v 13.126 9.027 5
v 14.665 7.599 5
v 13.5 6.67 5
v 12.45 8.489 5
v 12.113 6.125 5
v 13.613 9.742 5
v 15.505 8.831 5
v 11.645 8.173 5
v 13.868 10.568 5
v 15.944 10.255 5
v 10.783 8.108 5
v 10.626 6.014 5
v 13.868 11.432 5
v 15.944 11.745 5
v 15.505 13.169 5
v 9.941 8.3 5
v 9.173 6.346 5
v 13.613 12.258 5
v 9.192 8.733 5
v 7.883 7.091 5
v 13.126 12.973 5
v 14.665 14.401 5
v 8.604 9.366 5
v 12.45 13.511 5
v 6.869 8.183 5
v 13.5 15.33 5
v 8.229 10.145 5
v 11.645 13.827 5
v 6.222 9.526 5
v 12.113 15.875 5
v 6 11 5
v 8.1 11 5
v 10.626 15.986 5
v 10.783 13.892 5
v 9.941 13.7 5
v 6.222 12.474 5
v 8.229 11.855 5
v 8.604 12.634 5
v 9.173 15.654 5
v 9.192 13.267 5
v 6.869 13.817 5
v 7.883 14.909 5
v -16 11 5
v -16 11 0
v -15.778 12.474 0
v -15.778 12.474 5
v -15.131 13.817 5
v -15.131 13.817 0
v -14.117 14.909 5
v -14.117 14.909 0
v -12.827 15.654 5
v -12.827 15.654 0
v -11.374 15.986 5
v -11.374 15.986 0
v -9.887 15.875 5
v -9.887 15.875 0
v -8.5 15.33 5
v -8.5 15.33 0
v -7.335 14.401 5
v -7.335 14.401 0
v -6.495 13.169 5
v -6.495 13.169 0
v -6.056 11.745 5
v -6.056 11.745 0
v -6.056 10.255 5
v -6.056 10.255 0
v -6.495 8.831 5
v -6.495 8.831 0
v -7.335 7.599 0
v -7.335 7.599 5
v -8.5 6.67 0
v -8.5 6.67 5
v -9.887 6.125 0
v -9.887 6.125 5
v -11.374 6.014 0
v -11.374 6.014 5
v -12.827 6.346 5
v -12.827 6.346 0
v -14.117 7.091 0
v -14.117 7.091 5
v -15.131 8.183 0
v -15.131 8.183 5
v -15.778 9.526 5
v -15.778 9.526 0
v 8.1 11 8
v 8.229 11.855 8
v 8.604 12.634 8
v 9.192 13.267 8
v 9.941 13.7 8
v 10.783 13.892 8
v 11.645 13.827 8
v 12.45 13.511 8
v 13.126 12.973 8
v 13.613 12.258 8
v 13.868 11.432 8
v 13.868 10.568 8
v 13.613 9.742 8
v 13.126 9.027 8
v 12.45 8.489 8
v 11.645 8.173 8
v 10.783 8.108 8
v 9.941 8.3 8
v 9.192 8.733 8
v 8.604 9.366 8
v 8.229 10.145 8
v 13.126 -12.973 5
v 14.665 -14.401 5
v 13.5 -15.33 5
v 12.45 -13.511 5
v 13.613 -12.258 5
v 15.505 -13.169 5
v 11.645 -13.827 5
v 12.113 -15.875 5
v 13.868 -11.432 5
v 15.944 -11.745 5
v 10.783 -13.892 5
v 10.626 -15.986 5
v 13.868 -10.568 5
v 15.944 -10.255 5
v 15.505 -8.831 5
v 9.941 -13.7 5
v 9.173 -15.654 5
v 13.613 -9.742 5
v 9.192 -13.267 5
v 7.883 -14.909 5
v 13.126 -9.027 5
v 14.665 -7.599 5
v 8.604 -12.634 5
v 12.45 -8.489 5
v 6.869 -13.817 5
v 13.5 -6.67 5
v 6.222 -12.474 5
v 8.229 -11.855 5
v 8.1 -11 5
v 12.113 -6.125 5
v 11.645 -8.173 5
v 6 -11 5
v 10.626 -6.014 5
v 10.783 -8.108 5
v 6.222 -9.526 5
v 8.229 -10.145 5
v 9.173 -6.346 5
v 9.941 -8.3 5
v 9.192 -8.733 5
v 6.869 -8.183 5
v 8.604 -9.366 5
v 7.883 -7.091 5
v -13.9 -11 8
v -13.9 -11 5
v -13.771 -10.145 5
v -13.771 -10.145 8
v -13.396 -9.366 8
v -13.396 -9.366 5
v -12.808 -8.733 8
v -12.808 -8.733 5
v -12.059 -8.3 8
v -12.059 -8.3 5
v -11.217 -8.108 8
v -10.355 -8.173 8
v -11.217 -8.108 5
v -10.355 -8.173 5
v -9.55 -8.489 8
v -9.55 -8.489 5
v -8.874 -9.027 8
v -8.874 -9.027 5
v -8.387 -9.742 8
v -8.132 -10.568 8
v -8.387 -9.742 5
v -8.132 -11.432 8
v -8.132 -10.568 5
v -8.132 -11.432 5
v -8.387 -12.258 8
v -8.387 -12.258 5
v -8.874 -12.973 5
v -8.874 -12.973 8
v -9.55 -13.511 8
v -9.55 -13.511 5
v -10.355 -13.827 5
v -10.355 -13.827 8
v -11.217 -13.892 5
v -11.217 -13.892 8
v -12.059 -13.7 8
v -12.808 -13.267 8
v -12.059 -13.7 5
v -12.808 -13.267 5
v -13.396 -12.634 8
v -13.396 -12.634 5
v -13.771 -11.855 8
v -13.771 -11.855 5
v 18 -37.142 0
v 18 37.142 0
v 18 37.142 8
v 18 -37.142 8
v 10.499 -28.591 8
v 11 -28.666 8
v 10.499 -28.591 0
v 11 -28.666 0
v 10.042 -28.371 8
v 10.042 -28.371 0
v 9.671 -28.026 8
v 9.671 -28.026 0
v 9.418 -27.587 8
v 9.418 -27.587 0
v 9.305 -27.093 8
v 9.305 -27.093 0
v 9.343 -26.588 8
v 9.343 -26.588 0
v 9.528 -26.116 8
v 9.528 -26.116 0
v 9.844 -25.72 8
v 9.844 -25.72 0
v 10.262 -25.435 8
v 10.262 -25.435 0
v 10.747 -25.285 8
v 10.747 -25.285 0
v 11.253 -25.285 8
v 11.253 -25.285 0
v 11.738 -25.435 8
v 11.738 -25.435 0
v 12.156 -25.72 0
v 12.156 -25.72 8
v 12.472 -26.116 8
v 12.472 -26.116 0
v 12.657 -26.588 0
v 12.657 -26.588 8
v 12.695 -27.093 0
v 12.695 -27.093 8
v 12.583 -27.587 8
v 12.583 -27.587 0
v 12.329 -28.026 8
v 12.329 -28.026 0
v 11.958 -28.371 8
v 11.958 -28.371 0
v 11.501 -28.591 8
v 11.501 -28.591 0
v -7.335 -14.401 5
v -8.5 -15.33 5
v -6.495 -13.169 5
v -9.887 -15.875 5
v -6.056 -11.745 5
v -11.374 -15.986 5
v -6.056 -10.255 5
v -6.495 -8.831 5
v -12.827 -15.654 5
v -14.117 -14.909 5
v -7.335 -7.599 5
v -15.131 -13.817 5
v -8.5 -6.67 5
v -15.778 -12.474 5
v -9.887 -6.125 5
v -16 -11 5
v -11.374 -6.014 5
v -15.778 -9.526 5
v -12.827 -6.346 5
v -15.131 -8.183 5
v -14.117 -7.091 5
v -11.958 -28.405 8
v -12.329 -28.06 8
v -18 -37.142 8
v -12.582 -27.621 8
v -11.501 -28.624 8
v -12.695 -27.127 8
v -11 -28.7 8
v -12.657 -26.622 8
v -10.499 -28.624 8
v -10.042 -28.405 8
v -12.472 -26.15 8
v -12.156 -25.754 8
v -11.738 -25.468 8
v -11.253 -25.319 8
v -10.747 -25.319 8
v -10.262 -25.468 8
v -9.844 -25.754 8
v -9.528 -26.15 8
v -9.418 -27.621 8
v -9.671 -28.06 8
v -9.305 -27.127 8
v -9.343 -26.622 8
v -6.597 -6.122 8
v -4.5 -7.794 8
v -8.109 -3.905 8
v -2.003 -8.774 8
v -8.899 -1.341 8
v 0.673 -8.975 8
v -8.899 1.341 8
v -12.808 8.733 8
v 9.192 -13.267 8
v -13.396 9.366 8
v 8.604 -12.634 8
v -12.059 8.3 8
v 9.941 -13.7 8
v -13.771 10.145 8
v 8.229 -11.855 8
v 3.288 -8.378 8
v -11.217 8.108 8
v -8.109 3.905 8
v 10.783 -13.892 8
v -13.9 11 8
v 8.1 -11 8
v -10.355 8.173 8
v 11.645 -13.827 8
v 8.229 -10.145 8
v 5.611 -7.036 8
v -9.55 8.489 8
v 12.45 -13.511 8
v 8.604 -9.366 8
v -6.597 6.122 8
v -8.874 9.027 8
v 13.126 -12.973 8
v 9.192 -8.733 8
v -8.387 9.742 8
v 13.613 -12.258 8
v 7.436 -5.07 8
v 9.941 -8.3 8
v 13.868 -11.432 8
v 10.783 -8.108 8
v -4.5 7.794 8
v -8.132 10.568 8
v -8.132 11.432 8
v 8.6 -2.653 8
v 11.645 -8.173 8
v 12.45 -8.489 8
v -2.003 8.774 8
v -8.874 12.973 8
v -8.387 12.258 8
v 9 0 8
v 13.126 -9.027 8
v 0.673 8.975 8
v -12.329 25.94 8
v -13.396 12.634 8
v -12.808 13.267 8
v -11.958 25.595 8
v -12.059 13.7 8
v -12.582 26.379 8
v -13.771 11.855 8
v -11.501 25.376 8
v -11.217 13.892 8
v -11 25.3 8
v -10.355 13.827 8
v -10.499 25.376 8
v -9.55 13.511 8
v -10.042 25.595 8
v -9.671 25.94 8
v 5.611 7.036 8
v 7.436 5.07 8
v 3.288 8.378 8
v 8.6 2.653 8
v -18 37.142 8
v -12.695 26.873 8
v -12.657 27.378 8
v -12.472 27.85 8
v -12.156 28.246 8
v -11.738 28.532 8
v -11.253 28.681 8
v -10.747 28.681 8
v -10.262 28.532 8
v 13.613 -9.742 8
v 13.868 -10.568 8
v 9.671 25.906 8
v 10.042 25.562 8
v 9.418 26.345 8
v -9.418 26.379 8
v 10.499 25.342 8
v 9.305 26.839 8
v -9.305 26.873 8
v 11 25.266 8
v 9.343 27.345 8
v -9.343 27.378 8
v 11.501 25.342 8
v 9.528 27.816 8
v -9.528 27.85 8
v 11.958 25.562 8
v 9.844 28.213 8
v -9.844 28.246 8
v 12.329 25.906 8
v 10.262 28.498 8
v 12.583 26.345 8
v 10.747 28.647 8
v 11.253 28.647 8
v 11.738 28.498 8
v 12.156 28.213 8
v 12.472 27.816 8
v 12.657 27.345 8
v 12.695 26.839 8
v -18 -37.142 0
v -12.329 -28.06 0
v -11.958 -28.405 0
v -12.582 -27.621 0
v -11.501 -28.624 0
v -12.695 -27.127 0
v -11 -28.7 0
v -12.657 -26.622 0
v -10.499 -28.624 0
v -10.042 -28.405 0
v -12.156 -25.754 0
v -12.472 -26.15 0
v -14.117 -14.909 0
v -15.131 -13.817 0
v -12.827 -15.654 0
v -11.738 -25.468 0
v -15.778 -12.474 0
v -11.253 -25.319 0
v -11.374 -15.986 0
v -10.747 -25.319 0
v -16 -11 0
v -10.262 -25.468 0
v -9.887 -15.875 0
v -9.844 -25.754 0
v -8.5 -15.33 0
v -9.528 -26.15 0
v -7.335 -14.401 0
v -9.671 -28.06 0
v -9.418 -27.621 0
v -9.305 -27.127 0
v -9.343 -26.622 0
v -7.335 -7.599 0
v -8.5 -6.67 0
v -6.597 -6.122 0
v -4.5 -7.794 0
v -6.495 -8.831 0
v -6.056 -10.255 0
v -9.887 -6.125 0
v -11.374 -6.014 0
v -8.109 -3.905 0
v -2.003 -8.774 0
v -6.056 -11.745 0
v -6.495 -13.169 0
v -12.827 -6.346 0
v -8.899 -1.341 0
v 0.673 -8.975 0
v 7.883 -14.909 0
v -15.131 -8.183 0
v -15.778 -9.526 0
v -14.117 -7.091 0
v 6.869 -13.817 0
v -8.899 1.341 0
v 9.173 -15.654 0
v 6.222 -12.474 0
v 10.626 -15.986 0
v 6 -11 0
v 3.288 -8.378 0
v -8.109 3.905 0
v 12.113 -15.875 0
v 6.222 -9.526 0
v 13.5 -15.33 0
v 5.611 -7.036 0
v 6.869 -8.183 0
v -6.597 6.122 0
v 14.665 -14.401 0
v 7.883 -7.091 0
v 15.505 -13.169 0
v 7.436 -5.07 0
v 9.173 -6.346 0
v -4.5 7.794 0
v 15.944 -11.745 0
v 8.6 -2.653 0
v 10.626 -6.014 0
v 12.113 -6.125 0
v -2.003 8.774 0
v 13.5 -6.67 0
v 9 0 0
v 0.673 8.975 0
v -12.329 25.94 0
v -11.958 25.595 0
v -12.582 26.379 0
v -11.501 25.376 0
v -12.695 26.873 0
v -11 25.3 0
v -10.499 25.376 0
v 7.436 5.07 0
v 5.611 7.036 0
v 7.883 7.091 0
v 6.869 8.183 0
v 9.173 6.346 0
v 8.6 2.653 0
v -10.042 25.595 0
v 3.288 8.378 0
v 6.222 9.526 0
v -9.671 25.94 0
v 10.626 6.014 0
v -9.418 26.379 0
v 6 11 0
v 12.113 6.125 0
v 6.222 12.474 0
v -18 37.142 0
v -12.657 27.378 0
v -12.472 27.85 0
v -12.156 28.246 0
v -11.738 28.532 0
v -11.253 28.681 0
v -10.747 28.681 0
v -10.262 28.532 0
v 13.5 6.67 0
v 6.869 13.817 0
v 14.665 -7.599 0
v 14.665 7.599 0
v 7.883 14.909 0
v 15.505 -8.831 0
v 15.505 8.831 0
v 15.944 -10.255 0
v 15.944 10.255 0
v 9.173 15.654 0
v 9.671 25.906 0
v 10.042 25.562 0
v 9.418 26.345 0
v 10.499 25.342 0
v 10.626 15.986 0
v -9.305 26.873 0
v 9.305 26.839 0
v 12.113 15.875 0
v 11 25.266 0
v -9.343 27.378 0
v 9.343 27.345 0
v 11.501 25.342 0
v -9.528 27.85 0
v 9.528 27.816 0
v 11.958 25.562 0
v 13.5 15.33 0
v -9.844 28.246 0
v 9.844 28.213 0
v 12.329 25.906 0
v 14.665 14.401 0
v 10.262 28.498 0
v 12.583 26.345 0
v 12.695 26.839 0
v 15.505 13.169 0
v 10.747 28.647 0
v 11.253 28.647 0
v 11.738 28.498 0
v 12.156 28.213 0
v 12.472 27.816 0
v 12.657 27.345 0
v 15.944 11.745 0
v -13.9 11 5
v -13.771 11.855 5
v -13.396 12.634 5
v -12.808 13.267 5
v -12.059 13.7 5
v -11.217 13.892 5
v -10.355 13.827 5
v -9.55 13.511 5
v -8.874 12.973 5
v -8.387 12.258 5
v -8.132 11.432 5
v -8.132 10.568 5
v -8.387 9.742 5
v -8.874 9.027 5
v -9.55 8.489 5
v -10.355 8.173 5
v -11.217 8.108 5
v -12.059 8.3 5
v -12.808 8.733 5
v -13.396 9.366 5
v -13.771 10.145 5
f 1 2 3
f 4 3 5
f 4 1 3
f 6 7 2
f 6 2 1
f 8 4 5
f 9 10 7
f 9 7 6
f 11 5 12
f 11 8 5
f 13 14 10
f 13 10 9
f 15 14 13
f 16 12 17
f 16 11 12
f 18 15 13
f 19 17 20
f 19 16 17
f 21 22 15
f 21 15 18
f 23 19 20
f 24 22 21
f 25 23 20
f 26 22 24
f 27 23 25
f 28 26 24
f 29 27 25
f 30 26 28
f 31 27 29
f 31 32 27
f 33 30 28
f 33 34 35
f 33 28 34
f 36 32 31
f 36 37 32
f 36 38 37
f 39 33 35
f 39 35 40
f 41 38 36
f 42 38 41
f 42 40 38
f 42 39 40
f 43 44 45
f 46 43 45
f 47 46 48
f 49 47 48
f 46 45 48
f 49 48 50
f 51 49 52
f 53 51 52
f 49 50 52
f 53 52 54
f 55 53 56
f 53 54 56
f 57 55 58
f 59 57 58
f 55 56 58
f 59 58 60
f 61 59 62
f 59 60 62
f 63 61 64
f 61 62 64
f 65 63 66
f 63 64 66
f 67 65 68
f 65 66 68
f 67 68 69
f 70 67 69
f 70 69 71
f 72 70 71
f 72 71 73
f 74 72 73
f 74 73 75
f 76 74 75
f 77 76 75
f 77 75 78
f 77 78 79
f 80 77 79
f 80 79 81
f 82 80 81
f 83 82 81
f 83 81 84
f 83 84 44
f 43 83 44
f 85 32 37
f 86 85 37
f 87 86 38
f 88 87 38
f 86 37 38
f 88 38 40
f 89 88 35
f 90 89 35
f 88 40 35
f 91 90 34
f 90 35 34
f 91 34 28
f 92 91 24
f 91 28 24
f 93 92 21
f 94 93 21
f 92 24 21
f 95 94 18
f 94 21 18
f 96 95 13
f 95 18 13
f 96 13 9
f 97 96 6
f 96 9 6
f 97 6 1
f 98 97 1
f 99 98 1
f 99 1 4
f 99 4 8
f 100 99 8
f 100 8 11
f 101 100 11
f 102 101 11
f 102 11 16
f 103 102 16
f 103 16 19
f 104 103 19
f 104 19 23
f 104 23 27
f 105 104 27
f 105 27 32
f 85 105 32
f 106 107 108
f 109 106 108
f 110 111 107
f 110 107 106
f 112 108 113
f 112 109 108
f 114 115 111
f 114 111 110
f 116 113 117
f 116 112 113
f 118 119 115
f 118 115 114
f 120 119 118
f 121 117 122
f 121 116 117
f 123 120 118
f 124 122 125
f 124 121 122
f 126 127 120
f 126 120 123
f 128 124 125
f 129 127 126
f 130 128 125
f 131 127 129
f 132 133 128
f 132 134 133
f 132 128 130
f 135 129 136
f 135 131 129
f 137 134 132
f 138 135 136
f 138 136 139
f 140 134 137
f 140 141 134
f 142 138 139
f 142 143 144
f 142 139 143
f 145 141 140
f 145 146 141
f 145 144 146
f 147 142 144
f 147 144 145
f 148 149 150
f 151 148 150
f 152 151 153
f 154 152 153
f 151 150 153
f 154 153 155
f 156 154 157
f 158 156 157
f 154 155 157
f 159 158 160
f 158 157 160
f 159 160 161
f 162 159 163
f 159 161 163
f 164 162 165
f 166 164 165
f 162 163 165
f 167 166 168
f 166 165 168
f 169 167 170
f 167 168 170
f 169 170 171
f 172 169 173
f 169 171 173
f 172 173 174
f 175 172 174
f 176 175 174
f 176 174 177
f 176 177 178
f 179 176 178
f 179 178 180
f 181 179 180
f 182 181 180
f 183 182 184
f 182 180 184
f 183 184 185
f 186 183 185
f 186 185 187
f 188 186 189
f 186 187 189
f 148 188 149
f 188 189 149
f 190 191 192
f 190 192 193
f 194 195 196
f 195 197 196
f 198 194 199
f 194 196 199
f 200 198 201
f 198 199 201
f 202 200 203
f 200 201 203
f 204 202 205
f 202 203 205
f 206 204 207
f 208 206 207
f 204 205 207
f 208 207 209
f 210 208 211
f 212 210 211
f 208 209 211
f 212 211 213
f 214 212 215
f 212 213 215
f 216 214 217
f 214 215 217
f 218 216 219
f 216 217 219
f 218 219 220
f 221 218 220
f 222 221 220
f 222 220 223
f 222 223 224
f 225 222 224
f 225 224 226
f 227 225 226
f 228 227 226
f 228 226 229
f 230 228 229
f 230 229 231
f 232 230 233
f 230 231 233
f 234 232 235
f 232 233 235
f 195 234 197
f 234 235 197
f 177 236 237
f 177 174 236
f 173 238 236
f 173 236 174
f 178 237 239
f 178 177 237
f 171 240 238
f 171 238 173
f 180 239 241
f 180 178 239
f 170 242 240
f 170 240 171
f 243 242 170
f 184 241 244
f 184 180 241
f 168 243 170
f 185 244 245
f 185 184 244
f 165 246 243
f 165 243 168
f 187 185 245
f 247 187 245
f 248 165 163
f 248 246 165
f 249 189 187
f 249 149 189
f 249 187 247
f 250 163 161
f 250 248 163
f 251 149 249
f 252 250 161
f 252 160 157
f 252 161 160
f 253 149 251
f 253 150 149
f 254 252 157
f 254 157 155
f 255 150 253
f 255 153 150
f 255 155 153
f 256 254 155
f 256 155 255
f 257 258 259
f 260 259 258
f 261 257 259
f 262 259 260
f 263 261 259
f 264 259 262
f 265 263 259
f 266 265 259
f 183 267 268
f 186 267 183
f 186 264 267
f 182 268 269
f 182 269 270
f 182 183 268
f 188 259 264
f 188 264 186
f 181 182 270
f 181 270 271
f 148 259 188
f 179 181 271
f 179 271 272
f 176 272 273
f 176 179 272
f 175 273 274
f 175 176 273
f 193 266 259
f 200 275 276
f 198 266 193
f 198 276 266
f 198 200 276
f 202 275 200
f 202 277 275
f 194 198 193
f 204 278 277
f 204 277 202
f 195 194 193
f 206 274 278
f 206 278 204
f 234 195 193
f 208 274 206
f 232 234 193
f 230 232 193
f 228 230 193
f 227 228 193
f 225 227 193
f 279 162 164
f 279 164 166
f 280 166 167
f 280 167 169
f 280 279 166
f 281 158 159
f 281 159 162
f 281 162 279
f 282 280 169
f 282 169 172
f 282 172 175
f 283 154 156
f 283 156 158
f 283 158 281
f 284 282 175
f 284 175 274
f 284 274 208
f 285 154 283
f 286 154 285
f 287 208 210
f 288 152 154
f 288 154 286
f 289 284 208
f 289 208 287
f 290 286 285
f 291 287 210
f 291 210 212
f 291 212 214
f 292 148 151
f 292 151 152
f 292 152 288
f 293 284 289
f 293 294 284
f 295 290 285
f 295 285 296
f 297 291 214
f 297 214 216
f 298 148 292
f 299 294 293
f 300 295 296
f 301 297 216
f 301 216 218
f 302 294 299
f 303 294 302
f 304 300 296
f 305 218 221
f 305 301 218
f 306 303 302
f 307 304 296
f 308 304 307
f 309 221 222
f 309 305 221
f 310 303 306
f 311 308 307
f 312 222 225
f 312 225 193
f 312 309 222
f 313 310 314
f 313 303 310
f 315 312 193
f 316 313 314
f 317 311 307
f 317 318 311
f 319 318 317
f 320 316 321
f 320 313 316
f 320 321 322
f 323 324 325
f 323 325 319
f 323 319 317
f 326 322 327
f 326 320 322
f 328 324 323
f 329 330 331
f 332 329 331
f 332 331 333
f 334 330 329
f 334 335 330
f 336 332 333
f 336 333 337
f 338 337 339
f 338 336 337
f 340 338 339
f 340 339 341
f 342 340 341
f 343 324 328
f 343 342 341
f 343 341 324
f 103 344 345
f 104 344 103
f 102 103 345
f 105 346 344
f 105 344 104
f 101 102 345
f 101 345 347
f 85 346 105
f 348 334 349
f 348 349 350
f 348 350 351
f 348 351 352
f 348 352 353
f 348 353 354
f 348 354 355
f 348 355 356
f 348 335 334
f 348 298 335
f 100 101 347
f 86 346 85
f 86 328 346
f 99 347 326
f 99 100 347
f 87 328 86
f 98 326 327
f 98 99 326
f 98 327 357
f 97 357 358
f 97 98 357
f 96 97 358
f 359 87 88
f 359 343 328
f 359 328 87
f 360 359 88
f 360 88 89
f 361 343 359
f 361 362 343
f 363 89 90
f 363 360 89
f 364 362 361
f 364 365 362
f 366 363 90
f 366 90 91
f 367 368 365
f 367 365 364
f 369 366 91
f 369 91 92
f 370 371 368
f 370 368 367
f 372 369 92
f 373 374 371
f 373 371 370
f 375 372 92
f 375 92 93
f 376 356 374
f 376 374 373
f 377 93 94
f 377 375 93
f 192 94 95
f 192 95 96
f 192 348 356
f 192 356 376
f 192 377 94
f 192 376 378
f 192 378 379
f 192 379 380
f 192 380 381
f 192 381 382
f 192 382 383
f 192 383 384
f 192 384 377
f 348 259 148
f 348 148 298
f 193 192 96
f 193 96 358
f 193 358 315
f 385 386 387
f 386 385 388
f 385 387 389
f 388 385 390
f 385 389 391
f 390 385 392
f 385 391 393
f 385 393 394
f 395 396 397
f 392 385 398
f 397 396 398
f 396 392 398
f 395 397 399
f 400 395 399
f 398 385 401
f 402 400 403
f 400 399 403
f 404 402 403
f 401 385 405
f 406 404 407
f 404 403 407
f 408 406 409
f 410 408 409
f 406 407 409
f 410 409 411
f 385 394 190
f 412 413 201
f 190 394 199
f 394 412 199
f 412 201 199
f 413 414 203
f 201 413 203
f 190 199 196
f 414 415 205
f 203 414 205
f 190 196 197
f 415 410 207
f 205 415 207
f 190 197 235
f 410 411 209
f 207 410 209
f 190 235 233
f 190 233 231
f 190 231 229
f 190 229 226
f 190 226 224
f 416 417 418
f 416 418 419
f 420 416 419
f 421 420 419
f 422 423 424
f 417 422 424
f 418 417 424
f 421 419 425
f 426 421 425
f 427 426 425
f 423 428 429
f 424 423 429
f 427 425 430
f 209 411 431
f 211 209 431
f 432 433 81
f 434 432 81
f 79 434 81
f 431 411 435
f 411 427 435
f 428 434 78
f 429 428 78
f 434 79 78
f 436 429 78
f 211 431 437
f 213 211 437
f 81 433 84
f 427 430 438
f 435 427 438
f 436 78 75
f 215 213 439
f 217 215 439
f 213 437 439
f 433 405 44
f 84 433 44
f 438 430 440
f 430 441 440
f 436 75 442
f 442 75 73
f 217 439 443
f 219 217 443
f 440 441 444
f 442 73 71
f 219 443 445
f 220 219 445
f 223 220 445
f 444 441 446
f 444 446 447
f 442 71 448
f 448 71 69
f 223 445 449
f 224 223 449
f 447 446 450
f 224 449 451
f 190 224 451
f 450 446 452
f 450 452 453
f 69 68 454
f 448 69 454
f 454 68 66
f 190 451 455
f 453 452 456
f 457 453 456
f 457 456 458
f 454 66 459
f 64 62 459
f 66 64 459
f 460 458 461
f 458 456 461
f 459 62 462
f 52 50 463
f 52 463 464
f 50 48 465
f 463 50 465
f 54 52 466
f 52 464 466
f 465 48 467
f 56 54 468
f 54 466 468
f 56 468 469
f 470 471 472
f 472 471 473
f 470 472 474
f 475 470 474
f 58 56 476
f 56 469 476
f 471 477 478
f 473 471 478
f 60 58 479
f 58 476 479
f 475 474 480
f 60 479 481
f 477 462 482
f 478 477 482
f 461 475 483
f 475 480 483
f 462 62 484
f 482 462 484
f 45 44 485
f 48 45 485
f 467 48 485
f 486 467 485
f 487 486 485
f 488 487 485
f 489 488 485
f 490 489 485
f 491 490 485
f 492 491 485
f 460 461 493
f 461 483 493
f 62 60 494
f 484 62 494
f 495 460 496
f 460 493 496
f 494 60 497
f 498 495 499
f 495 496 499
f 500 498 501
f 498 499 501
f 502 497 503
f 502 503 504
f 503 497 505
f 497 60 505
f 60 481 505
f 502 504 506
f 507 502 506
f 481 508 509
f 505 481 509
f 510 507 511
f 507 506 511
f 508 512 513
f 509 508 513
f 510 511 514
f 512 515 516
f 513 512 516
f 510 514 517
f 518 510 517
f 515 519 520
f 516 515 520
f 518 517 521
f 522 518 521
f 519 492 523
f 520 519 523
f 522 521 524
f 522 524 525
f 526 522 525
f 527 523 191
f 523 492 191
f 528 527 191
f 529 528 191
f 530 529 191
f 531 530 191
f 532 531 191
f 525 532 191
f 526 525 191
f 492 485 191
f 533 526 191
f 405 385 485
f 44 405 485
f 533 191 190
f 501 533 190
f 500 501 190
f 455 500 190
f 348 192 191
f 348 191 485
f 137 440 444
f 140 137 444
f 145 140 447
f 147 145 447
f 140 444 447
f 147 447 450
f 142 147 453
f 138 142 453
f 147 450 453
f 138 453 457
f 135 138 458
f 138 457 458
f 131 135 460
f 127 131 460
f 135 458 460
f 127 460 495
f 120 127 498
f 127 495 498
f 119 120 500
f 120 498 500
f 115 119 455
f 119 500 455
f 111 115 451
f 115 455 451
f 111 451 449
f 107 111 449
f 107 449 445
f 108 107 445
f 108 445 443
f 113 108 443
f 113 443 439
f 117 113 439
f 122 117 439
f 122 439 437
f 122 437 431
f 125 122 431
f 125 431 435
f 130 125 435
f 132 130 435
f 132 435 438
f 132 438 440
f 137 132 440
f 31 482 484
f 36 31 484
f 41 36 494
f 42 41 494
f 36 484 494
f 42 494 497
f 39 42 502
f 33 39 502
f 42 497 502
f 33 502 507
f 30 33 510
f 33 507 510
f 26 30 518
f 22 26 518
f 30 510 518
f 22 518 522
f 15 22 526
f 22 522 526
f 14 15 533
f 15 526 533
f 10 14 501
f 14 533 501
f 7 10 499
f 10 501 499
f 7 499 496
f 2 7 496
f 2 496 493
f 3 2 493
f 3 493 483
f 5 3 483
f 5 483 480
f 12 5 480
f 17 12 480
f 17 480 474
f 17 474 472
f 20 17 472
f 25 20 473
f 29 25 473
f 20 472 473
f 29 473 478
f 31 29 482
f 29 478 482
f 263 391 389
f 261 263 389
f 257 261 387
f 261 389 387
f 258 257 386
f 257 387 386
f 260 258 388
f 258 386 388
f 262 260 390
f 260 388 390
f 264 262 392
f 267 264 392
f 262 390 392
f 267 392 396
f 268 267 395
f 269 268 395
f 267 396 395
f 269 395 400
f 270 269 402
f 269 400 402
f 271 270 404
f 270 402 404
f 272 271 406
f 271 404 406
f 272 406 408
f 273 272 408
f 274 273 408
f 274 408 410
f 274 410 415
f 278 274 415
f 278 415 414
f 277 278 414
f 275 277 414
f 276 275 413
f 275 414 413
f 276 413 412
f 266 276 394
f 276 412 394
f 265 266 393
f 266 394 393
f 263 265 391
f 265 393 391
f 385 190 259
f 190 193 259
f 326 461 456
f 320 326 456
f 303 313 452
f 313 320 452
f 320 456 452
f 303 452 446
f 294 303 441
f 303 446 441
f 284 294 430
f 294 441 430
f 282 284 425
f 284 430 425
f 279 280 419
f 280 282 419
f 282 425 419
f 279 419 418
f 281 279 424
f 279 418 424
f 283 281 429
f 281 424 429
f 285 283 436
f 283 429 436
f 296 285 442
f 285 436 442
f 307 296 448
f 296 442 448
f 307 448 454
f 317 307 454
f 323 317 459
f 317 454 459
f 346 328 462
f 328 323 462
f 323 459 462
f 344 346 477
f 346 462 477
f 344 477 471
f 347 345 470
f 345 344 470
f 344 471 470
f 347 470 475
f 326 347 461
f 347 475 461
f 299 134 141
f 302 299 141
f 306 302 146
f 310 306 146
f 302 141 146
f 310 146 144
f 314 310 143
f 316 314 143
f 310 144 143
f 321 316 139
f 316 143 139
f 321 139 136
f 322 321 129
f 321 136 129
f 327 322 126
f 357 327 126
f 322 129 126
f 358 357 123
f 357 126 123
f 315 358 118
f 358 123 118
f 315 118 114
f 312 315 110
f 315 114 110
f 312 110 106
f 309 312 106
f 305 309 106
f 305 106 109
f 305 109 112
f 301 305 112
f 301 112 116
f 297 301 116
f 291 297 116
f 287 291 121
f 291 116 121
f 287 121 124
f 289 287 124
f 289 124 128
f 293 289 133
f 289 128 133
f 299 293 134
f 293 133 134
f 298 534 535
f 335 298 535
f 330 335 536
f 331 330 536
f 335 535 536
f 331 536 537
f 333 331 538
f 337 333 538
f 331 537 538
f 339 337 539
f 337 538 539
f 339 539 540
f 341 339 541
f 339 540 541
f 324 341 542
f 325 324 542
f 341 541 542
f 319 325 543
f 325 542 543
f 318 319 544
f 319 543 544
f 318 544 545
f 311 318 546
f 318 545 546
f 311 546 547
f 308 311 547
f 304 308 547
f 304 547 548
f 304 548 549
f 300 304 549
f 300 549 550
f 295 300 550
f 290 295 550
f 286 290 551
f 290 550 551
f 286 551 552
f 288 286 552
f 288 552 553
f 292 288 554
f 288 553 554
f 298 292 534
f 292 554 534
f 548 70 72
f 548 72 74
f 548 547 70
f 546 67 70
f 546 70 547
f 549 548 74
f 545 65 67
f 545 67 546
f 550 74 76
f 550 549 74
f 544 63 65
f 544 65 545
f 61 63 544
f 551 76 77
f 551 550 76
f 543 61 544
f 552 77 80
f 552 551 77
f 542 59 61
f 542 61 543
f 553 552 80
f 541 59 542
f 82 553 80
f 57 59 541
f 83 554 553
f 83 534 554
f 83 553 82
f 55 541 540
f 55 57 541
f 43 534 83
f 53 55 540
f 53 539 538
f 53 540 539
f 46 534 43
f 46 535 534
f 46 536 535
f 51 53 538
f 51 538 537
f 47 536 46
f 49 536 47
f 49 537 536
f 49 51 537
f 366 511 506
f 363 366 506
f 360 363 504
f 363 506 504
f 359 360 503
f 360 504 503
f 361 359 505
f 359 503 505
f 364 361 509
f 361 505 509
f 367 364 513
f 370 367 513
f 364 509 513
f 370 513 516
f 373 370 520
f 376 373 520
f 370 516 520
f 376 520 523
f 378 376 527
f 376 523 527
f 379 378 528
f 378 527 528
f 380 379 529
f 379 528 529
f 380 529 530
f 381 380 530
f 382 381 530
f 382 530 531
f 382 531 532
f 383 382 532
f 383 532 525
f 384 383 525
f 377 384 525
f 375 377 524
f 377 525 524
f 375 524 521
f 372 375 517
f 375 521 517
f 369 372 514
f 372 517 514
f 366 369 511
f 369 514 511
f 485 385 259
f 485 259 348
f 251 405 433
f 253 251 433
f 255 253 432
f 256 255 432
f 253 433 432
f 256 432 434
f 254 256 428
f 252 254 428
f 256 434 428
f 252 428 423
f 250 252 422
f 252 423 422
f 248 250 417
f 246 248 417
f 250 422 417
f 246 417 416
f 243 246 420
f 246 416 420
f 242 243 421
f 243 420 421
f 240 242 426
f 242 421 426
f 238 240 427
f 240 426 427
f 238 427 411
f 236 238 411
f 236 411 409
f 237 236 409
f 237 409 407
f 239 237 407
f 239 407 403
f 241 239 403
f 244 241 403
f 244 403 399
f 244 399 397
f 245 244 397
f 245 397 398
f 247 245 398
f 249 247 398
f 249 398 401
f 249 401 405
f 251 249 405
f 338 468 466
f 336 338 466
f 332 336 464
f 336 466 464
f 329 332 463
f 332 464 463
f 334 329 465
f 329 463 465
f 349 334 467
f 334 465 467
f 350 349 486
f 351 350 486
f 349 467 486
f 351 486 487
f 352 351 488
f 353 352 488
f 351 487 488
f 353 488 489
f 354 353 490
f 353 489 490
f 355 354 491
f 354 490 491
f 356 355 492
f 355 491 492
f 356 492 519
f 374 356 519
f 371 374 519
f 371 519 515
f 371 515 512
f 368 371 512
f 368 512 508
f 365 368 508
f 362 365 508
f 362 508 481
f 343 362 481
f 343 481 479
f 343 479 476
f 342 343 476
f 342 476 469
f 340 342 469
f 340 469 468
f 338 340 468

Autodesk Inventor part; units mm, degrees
ref_plane "YZ Plane" through (0, 0, 0) normal (1, 0, 0) x (0, 1, 0)
ref_plane "XZ Plane" through (0, 0, 0) normal (0, 1, 0) x (-1, 0, 0)
ref_plane "XY Plane" through (0, 0, 0) normal (0, 0, 1) x (1, 0, 0)
sketch "Sketch1" plane through (0, 0, 0) normal (0, 0, 1) x (1, 0, 0)
  line L0 (0, -50) -> (-18, -50)
  line L1 (-18, -50) -> (-18, 50)
  line L2 (-18, 50) -> (18, 50)
  line L3 (18, 50) -> (18, -50)
  line L4 (18, -50) -> (0, -50)
  circle A0 centre (0, 0) radius 9
extrude "Extrusion2" add sketch "Sketch1" along normal blind 8
sketch "Sketch3" plane through (0, 0, 8) normal (0, 0, 1) x (1, 0, 0)
  line L0 (-18, 0) -> (18, 0) construction
  line L1 (18, 50) -> (18, -50) construction
  line L2 (-18, 50) -> (-18, -50) construction
  line L3 (-18, -50) -> (18, -50) projected
  line L4 (-18, -50) -> (18, -50)
  line L5 (18, -50) -> (18, -38)
  line L6 (18, -38) -> (-18, -38)
  line L7 (-18, -38) -> (-18, -50)
  line L8 (18, 50) -> (-18, 50) projected
  line L9 (-18, 50) -> (18, 50)
  line L10 (18, 50) -> (18, 38)
  line L11 (18, 38) -> (-18, 38)
  line L12 (-18, 38) -> (-18, 50)
  point P0 (0, 0)
  point P1 (-11, -27)
  point P2 (11.0001, -26.9664)
  point P3 (-11, 27)
  point P4 (11.0001, 26.9664)
  dimension "d57" = 36
  dimension "d58" = 12
  dimension "d59" = 36
  dimension "d60" = 12
hole "Hole1" at (-11, -27, 8) at (11.0001, -26.9664, 8) at (-11, 27, 8) at (11.0001, 26.9664, 8) direction (0, 0, -1) diameter 3.4 end through all clearance for "Countersunk Flat Head Screw ISO 2009/7046" size "M3" standard "ISO"
sketch "Sketch6" plane through (0, 0, 0) normal (0, 0, -1) x (-1, 0, 0)
  circle A0 centre (-11, -11) radius 2.9
  circle A1 centre (11, -11) radius 2.9
  circle A2 centre (11, 11) radius 2.9
  circle A3 centre (-11, 11) radius 2.9
  point P0 (0, 0)
extrude "Extrusion5" cut sketch "Sketch6" against normal through all
sketch "Sketch7" plane through (0, 0, 0) normal (0, 0, -1) x (-1, 0, 0)
  circle A0 centre (-11, -11) radius 2.9 projected
  circle A1 centre (-11, -11) radius 5
  circle A2 centre (-11, 11) radius 2.9 projected
  circle A3 centre (-11, 11) radius 5
  circle A4 centre (11, 11) radius 2.9 projected
  circle A5 centre (11, 11) radius 5
  circle A6 centre (11, -11) radius 2.9 projected
  circle A7 centre (11, -11) radius 5
  point P0 (0, 0)
  dimension "d44" = 10
  dimension "d45" = 10
  dimension "d46" = 10
  dimension "d47" = 10
extrude "Extrusion6" cut sketch "Sketch7" against normal blind 5
sketch "Sketch8" plane through (0, 0, 8) normal (0, 0, 1) x (1, 0, 0)
  line L0 (-18, 50) -> (-18, -50) projected
  line L1 (18, -49.142) -> (18, -37.142)
  line L2 (18, -37.142) -> (-18, -37.142)
  line L3 (-18, -37.142) -> (-18, -49.142)
  line L4 (18, 49.142) -> (18, 37.142)
  line L5 (18, 37.142) -> (-18, 37.142)
  line L6 (-18, 37.142) -> (-18, 49.142)
  line L7 (-18, -50) -> (18, -50) projected
  line L8 (18, -37.142) -> (-18, -37.142)
  line L9 (-18, -37.142) -> (-18, -50)
  line L10 (-18, -50) -> (18, -50)
  line L11 (18, -50) -> (18, -37.142)
  line L12 (-18, 50) -> (18, 50) projected
  line L13 (18, 37.142) -> (-18, 37.142)
  line L14 (-18, 37.142) -> (-18, 50)
  line L15 (-18, 50) -> (18, 50)
  line L16 (18, 50) -> (18, 37.142)
  point P0 (0, 0)
  dimension "d61" = 36
  dimension "d62" = 12
  dimension "d63" = 36
  dimension "d64" = 12
extrude "Extrusion7" cut sketch "Sketch8" against normal through all
properties part number "MOJ KOLNIERZ" material "Stainless Steel, Austenitic"
